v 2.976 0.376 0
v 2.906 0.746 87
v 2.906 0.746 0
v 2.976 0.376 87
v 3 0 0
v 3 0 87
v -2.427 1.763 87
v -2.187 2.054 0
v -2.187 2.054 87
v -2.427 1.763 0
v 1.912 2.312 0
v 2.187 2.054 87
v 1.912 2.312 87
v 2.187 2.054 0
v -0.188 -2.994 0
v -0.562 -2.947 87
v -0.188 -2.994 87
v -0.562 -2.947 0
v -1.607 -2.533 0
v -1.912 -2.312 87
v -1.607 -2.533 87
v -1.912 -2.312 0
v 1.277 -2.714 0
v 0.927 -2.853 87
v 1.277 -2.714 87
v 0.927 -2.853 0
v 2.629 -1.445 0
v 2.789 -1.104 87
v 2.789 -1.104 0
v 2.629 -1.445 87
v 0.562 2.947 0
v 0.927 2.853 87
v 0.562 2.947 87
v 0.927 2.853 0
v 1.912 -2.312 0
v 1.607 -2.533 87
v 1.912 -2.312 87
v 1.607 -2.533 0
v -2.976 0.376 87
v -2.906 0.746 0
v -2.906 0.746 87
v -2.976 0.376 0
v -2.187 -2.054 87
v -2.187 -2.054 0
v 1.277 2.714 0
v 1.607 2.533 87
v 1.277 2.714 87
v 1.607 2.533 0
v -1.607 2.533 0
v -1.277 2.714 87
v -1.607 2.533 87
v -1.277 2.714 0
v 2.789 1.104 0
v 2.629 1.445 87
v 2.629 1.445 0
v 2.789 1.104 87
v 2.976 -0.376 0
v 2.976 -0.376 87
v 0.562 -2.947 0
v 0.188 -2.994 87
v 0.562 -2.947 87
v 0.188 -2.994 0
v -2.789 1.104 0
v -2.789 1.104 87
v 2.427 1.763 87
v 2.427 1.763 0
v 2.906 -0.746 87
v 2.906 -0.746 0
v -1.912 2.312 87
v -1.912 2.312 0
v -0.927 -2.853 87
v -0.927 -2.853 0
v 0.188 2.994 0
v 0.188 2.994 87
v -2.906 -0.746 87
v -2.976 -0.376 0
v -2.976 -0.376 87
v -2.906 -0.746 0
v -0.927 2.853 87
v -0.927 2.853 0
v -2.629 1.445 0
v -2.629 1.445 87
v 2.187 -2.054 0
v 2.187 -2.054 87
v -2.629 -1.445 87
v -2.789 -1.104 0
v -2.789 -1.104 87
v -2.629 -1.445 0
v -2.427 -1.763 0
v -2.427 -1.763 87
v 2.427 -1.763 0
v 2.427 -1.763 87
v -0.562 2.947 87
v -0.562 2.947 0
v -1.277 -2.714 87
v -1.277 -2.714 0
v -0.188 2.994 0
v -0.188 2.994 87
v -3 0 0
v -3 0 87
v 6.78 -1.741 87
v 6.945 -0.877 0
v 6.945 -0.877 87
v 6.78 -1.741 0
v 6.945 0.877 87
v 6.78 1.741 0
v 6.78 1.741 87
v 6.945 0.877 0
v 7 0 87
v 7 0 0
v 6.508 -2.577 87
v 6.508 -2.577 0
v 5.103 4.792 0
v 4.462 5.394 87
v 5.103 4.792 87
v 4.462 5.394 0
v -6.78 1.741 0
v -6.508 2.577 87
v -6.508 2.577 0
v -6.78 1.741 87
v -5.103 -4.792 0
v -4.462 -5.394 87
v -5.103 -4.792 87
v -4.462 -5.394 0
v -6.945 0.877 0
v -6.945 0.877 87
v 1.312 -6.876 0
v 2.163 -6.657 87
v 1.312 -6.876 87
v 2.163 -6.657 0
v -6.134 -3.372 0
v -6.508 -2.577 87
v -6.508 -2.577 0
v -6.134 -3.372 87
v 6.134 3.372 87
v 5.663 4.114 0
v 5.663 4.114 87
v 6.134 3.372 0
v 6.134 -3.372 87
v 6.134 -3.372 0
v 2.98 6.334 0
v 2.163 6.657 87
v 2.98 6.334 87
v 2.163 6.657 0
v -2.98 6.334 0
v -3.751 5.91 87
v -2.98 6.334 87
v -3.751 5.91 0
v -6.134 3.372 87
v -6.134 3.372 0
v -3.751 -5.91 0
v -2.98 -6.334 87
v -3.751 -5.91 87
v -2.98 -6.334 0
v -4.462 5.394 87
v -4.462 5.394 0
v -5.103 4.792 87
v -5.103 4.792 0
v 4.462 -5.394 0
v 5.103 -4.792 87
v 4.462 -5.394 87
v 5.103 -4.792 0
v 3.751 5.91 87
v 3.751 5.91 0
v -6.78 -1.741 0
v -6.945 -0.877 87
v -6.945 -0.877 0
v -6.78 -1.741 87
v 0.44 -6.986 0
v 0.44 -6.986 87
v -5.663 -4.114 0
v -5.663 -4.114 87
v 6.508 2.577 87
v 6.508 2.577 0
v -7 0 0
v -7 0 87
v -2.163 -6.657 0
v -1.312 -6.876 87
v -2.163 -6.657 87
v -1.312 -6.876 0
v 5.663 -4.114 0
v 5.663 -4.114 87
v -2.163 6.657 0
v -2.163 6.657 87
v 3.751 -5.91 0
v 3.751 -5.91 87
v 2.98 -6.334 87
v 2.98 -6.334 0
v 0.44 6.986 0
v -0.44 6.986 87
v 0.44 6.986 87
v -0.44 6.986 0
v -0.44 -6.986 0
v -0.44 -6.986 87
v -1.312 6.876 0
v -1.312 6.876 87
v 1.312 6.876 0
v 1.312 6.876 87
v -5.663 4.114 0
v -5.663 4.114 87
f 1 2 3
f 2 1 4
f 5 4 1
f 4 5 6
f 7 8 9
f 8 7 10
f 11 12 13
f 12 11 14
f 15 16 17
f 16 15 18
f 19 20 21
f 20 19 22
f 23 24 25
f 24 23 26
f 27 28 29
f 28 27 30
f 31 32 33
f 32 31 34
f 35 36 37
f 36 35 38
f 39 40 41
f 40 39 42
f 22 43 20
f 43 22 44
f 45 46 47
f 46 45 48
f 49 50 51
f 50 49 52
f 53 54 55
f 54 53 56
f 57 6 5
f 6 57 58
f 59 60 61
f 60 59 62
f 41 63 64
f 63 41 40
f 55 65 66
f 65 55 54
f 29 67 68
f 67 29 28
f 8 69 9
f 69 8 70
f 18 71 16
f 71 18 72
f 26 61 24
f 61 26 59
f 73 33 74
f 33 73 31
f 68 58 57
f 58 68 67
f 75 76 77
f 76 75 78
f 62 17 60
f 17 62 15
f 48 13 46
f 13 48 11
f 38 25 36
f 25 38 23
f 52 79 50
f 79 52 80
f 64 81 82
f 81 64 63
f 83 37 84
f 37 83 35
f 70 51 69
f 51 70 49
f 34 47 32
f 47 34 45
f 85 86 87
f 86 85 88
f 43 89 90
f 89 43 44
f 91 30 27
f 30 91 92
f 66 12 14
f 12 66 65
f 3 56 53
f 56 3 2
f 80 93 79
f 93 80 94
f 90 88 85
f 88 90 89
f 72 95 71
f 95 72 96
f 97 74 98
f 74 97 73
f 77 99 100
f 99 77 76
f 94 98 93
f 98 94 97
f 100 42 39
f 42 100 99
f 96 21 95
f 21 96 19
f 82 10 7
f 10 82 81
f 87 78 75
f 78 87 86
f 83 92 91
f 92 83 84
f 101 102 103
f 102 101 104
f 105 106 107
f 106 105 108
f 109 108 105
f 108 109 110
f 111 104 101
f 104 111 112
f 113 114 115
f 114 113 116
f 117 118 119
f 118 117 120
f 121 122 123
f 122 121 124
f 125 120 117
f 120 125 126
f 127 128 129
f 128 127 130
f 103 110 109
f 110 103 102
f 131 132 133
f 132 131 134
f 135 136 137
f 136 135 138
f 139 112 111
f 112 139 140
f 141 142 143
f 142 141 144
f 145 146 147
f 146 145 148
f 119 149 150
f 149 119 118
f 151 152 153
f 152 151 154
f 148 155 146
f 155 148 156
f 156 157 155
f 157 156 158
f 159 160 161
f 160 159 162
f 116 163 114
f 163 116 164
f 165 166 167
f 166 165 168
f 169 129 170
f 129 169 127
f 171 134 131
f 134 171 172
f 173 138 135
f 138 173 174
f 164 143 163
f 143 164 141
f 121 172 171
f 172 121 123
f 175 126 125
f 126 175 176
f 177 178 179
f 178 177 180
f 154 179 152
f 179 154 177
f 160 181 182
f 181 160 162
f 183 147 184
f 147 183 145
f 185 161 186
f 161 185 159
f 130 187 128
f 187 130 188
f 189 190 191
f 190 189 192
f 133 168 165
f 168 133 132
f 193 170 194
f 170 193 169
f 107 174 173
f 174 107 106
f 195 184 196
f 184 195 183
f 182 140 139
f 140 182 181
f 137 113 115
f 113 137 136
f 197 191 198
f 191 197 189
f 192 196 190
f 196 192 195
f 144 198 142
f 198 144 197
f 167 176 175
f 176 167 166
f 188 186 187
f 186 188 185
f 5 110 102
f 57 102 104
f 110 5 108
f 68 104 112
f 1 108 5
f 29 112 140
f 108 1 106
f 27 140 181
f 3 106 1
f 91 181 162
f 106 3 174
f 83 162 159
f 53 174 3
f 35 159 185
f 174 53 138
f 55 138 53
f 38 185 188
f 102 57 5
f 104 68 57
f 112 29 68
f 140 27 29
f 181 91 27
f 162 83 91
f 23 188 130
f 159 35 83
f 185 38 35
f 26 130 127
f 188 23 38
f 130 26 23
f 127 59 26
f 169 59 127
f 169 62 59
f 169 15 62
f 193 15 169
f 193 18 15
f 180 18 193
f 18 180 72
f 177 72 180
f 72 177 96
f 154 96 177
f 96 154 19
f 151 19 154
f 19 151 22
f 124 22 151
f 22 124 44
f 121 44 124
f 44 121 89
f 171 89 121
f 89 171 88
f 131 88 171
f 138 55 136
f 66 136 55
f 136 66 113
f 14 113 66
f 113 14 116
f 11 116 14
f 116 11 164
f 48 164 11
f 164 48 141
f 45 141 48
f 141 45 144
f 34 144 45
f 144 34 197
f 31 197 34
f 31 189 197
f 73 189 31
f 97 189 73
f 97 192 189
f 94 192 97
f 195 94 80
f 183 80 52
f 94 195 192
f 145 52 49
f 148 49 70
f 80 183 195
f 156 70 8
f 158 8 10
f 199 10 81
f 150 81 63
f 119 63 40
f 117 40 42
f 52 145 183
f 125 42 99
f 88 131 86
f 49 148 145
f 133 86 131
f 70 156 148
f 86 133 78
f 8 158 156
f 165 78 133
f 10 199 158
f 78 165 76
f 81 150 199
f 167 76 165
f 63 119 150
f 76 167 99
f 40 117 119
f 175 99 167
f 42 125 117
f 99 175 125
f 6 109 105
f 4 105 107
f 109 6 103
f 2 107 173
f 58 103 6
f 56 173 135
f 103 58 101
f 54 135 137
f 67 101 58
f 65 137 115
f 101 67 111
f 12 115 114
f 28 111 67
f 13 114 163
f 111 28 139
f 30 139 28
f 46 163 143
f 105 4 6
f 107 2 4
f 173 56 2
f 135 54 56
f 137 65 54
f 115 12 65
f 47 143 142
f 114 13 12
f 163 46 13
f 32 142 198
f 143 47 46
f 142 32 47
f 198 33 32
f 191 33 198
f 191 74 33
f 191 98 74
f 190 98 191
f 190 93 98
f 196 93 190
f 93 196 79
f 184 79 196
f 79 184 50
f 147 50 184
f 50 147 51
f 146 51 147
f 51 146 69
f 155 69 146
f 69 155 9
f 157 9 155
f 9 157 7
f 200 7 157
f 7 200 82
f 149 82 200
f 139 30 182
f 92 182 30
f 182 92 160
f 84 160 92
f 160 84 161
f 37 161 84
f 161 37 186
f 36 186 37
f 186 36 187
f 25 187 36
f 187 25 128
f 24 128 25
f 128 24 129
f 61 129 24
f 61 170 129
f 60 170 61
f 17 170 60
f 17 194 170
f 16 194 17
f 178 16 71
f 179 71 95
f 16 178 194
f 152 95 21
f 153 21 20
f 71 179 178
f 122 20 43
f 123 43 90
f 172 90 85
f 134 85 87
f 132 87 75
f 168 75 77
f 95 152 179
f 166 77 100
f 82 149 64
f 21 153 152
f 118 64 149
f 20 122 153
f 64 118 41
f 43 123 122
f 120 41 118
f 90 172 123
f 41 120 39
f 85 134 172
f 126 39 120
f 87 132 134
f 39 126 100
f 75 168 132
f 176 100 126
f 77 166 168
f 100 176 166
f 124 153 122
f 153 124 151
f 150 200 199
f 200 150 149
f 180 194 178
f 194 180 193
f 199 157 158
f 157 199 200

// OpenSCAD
$fn = 50;


difference() {
	union() {
		cylinder(h = 87, r = 7.0000000000);
	}
	union() {
		translate(v = [0.0000000000, 0.0000000000, -100.0000000000]) {
			cylinder(h = 200, r = 3.0000000000);
		}
		translate(v = [0.0000000000, 0.0000000000, -100.0000000000]) {
			cylinder(h = 200, r = 3.0000000000);
		}
		translate(v = [0.0000000000, 0.0000000000, -100.0000000000]) {
			cylinder(h = 200, r = 3.0000000000);
		}
		translate(v = [0.0000000000, 0.0000000000, -100.0000000000]) {
			cylinder(h = 200, r = 3.0000000000);
		}
	}
}
